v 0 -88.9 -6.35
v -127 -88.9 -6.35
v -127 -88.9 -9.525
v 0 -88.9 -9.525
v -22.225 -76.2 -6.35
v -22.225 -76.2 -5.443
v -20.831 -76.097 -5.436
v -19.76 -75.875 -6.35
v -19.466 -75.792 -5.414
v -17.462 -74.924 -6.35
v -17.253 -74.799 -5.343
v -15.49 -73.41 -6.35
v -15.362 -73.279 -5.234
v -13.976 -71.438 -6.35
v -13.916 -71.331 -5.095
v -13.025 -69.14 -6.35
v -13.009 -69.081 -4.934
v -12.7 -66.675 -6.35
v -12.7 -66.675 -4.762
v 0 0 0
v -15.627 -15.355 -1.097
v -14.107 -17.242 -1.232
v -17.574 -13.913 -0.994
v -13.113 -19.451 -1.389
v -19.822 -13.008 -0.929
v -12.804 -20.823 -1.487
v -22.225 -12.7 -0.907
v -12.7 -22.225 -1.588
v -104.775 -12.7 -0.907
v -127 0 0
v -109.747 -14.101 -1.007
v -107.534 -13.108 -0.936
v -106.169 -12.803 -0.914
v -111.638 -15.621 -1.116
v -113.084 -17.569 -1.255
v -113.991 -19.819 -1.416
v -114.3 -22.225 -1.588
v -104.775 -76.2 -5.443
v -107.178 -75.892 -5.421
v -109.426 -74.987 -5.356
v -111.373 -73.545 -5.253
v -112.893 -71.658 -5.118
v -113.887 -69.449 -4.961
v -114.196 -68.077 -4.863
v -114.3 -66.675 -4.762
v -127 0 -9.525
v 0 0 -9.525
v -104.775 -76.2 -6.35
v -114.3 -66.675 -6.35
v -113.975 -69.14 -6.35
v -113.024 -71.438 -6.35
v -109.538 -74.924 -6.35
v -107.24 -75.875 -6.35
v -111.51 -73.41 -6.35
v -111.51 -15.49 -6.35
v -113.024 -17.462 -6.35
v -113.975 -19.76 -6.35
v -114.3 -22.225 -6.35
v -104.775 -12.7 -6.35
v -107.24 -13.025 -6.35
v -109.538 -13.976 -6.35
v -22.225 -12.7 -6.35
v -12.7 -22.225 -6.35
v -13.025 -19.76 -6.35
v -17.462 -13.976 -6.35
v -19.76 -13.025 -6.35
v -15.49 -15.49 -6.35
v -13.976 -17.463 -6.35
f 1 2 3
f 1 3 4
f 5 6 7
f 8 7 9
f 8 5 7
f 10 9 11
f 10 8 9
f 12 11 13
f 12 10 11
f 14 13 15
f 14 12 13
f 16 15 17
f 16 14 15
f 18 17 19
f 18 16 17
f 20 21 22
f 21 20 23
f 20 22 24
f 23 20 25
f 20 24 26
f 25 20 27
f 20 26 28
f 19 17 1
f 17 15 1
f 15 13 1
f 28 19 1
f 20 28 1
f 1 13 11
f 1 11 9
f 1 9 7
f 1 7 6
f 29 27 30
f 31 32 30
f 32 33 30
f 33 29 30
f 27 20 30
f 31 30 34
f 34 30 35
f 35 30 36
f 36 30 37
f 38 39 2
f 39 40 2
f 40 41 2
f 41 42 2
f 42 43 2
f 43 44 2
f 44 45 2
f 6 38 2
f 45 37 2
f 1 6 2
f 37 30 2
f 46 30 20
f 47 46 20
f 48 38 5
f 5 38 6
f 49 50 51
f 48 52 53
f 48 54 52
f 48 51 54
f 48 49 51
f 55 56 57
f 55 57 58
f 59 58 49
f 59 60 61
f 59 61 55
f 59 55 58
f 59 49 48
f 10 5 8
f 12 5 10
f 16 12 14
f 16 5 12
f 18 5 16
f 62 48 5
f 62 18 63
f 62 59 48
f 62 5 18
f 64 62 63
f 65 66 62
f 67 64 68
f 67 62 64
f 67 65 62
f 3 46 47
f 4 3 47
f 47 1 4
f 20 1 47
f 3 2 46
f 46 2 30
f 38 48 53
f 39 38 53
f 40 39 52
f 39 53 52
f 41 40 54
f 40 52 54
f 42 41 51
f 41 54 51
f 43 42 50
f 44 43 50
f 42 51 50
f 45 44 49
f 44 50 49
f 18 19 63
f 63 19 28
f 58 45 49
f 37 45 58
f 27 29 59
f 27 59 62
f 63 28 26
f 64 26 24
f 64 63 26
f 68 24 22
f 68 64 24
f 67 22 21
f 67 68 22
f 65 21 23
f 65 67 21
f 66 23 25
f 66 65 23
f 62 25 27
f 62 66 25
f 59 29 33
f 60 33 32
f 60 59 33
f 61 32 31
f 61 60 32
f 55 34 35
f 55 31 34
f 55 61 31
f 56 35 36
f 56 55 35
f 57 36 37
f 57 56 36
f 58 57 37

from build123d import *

# Parameters (mm, degrees)
F0_W     = 127
F0_H     = 88.9
F1_DEPTH = 9.525
F3_W     = 101.6
F3_H     = 63.5
F4_DEPTH = 6.35
F5_R     = 9.525
F6_DEPTH = 127.001


with BuildPart() as f1:
    # F0 (on Top) → F1 (new body)
    with BuildSketch(Plane.XY):
        with Locations((-63.5, -44.45)):
            Rectangle(F0_W, F0_H)
    extrude(amount=-F1_DEPTH)

    # F3 (on face) → F4 (cut)
    with BuildSketch(Plane.XY):
        with Locations((-63.5, -44.45)):
            Rectangle(F3_W, F3_H)
    extrude(amount=-F4_DEPTH, mode=Mode.SUBTRACT)

    # F5
    f5_edges = [f1.edges().sort_by_distance(p)[0] for p in [
        (-12.7, -12.7, -3.175),
        (-114.3, -12.7, -3.175),
        (-114.3, -76.2, -3.175),
        (-12.7, -76.2, -3.175),
    ]]
    fillet(f5_edges, radius=F5_R)

    # F2 (on face) → F6 (cut, through all)
    with BuildSketch(Plane(origin=(-127, 0, 0), x_dir=(0, -1, 0), z_dir=(-1, 0, 0))):
        Polygon((88.9, 0), (0, 0), (88.9, -6.35), align=None)
    extrude(amount=-F6_DEPTH, mode=Mode.SUBTRACT)


solid = f1.part
